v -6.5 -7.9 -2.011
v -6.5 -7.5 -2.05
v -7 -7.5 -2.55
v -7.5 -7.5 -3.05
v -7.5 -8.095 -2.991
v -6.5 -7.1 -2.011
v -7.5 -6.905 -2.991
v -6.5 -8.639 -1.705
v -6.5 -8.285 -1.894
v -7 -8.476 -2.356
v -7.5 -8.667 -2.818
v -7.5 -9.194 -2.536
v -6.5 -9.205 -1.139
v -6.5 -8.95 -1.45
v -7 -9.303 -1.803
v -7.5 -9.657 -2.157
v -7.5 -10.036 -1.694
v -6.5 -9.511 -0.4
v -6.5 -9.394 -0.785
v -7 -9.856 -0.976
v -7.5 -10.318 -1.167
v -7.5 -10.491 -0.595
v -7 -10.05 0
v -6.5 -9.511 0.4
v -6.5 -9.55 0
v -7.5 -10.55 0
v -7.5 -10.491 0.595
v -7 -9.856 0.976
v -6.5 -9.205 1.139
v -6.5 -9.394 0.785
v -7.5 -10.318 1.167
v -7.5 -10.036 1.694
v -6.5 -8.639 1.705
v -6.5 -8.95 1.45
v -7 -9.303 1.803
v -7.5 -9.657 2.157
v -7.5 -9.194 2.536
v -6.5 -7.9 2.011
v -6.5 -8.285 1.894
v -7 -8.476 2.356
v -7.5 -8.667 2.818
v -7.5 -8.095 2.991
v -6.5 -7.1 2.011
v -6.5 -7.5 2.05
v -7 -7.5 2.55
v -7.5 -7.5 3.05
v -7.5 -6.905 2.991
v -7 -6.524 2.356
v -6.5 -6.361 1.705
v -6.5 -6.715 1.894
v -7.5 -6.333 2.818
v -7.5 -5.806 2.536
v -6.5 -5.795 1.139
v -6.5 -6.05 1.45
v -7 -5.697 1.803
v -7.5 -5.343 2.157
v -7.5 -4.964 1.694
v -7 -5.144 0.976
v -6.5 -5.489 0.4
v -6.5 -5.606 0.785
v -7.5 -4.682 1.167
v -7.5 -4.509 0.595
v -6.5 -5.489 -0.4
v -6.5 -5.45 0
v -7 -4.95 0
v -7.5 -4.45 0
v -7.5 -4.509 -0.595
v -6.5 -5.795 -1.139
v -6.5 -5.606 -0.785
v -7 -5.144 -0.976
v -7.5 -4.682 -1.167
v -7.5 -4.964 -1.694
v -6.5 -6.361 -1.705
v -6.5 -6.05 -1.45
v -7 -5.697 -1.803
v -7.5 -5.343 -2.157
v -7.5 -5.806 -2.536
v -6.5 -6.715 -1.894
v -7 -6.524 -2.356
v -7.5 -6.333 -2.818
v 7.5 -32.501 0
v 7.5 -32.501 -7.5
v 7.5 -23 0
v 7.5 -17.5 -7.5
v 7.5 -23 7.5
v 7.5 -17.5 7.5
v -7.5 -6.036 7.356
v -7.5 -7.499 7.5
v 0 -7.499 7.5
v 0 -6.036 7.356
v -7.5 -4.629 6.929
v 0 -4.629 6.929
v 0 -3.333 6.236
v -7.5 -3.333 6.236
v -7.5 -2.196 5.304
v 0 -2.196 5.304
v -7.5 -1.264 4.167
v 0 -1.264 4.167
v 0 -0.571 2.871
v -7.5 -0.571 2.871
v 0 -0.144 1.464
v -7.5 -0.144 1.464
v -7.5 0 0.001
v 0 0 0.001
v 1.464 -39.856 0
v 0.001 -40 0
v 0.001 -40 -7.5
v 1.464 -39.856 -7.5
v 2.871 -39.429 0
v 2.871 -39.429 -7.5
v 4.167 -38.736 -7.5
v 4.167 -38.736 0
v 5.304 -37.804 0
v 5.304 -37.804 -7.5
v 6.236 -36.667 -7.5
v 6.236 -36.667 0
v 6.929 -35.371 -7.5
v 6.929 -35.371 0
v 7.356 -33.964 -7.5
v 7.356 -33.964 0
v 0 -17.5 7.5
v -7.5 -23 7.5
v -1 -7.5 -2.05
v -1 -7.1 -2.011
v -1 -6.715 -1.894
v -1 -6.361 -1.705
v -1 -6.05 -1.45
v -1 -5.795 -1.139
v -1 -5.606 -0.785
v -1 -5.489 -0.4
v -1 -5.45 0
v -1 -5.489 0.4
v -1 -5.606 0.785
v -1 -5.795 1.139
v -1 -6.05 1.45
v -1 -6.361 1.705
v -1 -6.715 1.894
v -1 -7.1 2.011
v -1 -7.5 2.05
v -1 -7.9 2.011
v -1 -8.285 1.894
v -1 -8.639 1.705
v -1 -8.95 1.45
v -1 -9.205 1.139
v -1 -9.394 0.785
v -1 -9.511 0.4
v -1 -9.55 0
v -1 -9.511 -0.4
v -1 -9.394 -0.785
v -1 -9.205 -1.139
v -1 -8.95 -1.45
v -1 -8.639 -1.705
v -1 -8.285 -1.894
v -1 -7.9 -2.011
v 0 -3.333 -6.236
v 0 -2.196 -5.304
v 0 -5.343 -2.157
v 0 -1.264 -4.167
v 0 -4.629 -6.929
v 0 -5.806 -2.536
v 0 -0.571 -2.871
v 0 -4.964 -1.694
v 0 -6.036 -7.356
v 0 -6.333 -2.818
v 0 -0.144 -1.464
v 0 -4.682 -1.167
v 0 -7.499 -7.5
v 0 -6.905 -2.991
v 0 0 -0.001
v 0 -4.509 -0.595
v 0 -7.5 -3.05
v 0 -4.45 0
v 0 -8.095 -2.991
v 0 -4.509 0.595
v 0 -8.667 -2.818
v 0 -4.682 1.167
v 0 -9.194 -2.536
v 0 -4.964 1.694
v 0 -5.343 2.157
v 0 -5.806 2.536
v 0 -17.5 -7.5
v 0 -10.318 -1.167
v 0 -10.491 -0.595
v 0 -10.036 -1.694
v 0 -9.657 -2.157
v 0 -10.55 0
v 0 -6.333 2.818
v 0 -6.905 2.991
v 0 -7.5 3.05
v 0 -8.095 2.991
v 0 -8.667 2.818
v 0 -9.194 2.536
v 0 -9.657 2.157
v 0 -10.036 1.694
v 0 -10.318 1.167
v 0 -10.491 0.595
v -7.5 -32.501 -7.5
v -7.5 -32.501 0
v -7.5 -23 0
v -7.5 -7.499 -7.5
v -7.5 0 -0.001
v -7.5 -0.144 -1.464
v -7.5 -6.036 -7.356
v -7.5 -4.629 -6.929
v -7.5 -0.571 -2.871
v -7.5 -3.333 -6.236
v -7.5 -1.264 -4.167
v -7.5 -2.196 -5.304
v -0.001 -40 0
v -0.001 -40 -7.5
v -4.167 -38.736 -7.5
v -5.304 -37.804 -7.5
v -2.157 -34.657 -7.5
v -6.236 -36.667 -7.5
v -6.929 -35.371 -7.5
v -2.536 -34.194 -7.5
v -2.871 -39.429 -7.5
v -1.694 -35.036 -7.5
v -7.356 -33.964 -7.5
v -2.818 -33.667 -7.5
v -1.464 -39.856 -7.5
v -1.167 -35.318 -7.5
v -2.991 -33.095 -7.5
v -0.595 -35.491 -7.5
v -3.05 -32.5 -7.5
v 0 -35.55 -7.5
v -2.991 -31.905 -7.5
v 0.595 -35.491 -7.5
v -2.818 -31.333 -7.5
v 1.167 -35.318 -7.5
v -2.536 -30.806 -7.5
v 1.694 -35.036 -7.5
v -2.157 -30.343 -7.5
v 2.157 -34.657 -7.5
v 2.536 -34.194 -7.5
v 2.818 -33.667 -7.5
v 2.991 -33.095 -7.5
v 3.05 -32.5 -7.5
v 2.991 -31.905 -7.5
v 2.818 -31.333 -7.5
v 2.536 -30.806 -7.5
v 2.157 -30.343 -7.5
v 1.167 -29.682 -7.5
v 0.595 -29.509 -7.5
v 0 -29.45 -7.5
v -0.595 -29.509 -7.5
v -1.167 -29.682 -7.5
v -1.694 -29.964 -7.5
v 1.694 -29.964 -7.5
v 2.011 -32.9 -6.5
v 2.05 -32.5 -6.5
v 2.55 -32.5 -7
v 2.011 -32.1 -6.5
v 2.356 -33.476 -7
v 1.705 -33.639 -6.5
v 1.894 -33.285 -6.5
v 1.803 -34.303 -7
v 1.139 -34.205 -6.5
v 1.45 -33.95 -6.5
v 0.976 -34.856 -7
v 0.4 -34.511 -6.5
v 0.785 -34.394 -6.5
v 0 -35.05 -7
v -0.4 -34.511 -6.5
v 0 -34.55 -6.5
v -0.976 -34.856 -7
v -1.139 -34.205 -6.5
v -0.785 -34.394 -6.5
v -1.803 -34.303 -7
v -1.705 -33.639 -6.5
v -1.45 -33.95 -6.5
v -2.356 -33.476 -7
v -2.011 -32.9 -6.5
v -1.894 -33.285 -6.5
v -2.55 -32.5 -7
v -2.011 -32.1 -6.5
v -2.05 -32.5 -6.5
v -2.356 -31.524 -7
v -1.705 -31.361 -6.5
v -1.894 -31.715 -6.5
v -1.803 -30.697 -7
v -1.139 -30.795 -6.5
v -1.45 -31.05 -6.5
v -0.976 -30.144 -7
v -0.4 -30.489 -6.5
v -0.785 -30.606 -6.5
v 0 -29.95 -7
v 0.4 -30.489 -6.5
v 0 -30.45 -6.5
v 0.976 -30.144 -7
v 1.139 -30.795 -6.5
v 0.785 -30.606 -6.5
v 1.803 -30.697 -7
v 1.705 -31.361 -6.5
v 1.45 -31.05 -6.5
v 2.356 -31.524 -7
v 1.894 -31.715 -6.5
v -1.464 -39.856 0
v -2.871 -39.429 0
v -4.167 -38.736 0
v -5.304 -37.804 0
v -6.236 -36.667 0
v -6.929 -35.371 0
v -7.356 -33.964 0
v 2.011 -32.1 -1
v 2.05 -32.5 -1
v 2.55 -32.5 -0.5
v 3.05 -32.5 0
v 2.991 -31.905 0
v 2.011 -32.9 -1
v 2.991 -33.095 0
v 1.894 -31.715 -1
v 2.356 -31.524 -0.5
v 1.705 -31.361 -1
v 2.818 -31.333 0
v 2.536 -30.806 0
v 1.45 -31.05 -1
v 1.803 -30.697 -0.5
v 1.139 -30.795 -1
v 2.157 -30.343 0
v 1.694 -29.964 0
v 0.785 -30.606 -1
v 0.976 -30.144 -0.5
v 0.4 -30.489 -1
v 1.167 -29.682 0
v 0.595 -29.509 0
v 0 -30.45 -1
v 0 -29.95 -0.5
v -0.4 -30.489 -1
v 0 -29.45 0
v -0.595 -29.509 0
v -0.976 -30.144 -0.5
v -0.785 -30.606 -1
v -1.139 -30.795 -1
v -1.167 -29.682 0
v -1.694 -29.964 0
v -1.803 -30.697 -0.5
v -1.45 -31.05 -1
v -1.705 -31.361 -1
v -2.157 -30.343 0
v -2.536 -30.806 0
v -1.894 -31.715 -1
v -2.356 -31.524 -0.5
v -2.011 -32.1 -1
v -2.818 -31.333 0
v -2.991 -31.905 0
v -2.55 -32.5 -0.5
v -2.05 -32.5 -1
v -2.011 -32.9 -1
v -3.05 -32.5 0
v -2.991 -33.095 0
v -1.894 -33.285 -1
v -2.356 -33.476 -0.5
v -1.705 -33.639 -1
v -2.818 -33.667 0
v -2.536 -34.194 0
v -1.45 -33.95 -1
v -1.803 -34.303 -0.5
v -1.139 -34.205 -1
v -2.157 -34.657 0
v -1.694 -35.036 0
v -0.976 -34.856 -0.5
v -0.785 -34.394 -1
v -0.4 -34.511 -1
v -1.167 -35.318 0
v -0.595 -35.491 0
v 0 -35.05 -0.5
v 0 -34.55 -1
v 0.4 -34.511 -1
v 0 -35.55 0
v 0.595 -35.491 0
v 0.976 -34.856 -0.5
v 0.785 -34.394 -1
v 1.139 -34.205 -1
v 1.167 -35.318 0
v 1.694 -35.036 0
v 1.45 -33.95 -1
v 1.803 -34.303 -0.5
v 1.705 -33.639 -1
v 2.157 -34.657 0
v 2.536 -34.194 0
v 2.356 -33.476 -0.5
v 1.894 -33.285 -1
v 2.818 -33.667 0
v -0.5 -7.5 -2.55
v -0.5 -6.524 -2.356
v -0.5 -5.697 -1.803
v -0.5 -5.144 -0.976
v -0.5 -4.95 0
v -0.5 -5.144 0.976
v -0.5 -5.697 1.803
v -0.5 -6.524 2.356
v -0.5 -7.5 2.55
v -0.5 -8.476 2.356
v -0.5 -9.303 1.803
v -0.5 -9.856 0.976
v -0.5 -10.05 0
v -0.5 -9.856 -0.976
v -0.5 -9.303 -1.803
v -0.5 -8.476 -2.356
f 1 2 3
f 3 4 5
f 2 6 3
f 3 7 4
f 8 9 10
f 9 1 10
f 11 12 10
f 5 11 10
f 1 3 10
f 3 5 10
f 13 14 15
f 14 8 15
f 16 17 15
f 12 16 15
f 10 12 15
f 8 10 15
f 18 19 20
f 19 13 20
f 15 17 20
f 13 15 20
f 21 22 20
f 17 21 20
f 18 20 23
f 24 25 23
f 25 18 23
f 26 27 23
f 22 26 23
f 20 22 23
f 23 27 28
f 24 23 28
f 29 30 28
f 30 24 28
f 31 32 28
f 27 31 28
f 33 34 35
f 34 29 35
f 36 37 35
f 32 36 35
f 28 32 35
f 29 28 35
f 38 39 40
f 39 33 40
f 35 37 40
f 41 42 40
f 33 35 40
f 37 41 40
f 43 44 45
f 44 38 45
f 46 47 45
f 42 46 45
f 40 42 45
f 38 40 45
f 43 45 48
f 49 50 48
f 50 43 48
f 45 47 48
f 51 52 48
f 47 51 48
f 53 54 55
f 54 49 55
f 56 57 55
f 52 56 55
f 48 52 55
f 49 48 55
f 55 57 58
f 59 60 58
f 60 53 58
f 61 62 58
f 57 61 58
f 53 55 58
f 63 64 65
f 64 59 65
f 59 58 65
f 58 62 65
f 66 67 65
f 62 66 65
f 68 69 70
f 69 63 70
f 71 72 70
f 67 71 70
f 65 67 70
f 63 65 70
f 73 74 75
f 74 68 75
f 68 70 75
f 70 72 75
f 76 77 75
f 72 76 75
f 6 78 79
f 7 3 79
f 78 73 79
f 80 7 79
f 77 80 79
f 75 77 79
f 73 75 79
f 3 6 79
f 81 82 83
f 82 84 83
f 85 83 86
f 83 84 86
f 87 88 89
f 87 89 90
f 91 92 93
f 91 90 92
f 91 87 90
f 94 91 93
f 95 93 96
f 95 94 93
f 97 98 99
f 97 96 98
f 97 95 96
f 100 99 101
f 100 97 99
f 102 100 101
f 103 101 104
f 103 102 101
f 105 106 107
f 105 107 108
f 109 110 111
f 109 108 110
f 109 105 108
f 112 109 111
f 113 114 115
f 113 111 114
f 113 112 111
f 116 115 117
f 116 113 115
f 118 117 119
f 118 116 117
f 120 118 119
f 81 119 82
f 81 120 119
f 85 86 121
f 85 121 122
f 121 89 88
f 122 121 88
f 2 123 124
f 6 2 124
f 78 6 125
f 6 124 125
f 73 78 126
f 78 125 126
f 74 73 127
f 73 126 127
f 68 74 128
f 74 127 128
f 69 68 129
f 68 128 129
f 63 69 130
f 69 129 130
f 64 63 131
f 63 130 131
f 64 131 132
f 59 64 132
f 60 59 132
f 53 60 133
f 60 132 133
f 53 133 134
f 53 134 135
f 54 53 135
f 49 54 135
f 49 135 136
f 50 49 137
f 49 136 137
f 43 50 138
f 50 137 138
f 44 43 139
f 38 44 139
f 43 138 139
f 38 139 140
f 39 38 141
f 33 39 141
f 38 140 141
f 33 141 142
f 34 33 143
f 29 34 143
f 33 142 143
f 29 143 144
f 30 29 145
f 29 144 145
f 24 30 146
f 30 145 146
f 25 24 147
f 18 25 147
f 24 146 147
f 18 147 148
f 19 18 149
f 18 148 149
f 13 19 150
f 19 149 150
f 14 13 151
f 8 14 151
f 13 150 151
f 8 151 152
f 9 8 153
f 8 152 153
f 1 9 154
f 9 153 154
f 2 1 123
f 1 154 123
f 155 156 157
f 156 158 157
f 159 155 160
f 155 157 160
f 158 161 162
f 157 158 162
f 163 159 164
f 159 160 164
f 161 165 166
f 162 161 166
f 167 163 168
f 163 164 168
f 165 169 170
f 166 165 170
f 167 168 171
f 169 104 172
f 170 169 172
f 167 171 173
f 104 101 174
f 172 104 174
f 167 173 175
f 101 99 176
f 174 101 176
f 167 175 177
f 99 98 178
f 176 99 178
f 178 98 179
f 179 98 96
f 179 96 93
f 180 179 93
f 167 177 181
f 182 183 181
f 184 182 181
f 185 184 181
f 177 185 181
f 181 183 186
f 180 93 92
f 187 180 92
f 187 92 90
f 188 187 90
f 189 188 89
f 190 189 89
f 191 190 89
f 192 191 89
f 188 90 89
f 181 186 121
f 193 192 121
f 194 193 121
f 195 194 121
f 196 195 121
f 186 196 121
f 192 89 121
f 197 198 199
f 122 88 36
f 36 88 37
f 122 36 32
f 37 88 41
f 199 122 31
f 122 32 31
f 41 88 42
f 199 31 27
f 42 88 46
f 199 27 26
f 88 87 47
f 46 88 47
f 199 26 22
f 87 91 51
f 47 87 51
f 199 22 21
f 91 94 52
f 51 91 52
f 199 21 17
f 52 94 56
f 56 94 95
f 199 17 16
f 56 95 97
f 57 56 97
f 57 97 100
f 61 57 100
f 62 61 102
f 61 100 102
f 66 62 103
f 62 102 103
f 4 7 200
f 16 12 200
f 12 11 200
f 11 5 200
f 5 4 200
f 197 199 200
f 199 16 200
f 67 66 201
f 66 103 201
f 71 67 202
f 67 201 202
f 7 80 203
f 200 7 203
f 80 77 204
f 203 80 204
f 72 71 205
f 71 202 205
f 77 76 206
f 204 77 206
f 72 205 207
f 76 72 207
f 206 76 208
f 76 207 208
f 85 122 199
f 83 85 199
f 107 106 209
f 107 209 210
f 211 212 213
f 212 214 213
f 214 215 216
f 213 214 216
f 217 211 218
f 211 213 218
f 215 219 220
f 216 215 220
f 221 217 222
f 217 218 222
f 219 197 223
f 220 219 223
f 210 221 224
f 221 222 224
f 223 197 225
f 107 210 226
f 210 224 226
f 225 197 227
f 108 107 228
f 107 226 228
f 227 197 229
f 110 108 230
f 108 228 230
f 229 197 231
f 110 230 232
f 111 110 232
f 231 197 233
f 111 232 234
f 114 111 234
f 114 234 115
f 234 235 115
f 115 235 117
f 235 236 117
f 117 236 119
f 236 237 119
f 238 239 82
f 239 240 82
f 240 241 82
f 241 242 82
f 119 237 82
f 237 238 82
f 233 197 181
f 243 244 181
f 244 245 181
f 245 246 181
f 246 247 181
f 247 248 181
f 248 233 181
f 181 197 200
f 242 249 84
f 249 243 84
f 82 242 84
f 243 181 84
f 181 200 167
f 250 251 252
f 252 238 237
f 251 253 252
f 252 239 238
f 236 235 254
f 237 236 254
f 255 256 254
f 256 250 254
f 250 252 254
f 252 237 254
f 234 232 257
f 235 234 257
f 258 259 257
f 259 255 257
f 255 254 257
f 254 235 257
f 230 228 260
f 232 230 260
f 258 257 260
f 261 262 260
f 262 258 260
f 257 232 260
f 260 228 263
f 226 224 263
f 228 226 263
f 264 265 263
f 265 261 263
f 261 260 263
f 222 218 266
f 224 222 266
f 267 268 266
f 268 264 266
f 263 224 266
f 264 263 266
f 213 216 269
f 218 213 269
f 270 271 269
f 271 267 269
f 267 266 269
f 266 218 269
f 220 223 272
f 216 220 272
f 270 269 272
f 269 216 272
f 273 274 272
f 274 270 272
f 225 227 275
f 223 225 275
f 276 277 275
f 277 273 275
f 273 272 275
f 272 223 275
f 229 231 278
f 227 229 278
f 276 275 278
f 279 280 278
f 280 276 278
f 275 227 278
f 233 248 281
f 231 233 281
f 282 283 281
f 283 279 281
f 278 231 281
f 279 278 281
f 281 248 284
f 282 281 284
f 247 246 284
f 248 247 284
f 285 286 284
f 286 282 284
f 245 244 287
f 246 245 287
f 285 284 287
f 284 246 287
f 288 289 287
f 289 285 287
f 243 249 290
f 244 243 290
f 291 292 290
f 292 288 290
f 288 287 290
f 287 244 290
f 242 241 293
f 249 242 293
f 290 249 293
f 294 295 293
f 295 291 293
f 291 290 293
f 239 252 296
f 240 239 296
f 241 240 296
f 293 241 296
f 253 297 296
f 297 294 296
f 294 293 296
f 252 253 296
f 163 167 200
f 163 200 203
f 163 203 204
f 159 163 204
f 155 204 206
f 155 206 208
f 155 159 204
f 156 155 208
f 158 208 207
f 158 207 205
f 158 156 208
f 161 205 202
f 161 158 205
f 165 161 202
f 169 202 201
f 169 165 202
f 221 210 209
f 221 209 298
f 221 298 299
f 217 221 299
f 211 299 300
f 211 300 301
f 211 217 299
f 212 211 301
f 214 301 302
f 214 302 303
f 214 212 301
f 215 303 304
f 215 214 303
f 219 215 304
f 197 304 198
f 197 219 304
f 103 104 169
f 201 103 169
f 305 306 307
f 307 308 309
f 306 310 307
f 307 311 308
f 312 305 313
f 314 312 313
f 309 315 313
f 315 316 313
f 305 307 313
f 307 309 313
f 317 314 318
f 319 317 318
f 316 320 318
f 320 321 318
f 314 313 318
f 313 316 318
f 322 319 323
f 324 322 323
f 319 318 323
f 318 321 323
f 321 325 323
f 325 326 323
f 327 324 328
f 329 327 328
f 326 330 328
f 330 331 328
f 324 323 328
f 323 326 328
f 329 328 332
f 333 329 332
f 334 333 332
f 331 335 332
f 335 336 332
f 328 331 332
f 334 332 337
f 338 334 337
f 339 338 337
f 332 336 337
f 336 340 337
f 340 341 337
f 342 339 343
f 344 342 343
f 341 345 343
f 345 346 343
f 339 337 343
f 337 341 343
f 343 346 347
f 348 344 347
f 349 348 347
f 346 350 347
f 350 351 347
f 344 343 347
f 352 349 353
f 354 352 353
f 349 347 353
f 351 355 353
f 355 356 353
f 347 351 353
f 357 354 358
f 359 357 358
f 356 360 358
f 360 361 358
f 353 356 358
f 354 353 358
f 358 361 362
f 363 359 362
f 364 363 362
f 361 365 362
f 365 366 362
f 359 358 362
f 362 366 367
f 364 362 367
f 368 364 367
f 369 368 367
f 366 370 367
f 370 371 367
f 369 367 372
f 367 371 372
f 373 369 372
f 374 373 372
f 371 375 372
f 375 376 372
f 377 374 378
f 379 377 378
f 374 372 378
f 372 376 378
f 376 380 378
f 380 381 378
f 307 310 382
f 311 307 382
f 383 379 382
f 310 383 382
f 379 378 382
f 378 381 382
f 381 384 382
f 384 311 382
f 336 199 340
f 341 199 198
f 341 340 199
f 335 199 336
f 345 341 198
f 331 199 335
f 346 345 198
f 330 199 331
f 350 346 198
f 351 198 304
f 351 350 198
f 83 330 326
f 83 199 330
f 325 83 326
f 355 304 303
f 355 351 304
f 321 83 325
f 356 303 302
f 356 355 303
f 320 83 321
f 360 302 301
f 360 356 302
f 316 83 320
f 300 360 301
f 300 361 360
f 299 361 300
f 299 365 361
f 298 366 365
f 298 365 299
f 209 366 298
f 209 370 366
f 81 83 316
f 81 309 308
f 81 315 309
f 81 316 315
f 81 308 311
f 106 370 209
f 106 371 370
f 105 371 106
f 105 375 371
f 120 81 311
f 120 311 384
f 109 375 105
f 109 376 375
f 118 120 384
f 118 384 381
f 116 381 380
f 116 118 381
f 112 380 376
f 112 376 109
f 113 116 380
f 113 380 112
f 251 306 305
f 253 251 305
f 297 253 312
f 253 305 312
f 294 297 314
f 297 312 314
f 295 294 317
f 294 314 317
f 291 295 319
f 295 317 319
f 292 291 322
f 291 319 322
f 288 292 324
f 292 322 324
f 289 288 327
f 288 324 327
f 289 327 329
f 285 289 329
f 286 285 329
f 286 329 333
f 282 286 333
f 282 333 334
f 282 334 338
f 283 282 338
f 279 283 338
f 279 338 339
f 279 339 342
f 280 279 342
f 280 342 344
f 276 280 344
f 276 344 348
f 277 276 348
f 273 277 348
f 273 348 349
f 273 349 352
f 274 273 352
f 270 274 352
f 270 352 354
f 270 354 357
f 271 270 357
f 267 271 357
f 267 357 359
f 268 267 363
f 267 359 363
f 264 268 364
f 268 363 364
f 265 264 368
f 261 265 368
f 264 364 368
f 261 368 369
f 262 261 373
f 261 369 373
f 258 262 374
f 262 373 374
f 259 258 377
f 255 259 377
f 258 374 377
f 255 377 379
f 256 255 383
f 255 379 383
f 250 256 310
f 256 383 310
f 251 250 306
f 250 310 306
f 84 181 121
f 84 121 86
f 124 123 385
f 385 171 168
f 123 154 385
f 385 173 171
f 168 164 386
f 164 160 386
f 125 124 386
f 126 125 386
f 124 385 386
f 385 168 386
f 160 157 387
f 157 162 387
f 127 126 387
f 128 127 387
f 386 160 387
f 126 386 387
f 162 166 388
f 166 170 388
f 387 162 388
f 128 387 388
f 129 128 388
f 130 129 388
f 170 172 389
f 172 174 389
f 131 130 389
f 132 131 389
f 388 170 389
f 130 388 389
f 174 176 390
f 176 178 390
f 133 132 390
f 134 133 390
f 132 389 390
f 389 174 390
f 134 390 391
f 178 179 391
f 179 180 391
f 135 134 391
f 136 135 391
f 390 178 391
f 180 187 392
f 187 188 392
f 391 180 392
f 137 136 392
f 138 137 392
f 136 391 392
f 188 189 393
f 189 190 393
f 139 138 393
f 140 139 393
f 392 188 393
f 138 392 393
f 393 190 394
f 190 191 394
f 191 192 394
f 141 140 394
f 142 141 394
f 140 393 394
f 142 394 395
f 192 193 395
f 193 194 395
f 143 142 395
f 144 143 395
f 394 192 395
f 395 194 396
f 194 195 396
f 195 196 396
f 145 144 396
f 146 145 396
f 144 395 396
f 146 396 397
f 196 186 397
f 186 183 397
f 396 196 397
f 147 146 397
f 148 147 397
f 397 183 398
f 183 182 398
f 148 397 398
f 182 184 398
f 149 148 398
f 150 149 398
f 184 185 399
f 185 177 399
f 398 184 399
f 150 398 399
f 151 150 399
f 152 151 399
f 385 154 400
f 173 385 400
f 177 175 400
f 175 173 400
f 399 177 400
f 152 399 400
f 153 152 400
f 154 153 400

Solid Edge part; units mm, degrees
sketch "Sketch1" plane through (0, 0, 0) normal (0, -1, 0) x (1, 0, 0)
  line L0 (-7.5, -7.5) -> (7.5, -7.5)
  line L1 (7.5, -7.5) -> (7.5, 7.5)
  line L2 (7.5, 7.5) -> (-7.5, 7.5)
  line L3 (-7.5, 7.5) -> (-7.5, -7.5)
  dimension "D1" = 15
  dimension "D2" = 15
extrude "Protrusion1" add sketch "Sketch1" along normal blind 40
sketch "Sketch2" plane through (7.5, -20, 0) normal (1, 0, 0) x (0, 1, 0)
  line L0 (-20, 7.5) -> (-3, 7.5)
  line L1 (-3, 7.5) -> (-3, 0)
  line L2 (-3, 0) -> (-20, 0)
  line L3 (-20, 0) -> (-20, 7.5)
  dimension "D1" = 17
extrude "Cutout1" cut sketch "Sketch2" against normal through all
sketch "Sketch3" plane through (0, -11.5, 7.5) normal (0, 0, 1) x (1, 0, 0)
  line L0 (7.5, 11.5) -> (0, 11.5)
  line L1 (0, 11.5) -> (0, -6)
  line L2 (0, -6) -> (7.5, -6)
  line L3 (7.5, -6) -> (7.5, 11.5)
  dimension "D1" = 17.5
extrude "Cutout2" cut sketch "Sketch3" against normal through all
fillet "Verrundung_1" radius 7.5 4 edges at (7.5, -40, -3.75) (-7.5, -40, -3.75) (-3.75, 0, 7.5) (-3.75, 0, -7.5)
sketch "Sketch4" plane through (0, -8.75, 0) normal (1, 0, 0) x (0, 0, -1)
  circle A0 centre (0, 1.25) radius 2.05
  dimension "D1" = 4.1
extrude "Cutout3" cut sketch "Sketch4" against normal through all
sketch "Sketch5" plane through (0, -31.5, 0) normal (0, 0, 1) x (1, 0, 0)
  circle A0 centre (0, -1) radius 2.05
  dimension "D1" = 4.1
extrude "Cutout4" cut sketch "Sketch5" against normal through all
chamfer "Fase_1" distance 1 angle 45 4 edges at (0, -7.5, 2.05) (-2.05, -32.5, 0) (-2.05, -32.5, -7.5) (-7.5, -7.5, 2.05)
